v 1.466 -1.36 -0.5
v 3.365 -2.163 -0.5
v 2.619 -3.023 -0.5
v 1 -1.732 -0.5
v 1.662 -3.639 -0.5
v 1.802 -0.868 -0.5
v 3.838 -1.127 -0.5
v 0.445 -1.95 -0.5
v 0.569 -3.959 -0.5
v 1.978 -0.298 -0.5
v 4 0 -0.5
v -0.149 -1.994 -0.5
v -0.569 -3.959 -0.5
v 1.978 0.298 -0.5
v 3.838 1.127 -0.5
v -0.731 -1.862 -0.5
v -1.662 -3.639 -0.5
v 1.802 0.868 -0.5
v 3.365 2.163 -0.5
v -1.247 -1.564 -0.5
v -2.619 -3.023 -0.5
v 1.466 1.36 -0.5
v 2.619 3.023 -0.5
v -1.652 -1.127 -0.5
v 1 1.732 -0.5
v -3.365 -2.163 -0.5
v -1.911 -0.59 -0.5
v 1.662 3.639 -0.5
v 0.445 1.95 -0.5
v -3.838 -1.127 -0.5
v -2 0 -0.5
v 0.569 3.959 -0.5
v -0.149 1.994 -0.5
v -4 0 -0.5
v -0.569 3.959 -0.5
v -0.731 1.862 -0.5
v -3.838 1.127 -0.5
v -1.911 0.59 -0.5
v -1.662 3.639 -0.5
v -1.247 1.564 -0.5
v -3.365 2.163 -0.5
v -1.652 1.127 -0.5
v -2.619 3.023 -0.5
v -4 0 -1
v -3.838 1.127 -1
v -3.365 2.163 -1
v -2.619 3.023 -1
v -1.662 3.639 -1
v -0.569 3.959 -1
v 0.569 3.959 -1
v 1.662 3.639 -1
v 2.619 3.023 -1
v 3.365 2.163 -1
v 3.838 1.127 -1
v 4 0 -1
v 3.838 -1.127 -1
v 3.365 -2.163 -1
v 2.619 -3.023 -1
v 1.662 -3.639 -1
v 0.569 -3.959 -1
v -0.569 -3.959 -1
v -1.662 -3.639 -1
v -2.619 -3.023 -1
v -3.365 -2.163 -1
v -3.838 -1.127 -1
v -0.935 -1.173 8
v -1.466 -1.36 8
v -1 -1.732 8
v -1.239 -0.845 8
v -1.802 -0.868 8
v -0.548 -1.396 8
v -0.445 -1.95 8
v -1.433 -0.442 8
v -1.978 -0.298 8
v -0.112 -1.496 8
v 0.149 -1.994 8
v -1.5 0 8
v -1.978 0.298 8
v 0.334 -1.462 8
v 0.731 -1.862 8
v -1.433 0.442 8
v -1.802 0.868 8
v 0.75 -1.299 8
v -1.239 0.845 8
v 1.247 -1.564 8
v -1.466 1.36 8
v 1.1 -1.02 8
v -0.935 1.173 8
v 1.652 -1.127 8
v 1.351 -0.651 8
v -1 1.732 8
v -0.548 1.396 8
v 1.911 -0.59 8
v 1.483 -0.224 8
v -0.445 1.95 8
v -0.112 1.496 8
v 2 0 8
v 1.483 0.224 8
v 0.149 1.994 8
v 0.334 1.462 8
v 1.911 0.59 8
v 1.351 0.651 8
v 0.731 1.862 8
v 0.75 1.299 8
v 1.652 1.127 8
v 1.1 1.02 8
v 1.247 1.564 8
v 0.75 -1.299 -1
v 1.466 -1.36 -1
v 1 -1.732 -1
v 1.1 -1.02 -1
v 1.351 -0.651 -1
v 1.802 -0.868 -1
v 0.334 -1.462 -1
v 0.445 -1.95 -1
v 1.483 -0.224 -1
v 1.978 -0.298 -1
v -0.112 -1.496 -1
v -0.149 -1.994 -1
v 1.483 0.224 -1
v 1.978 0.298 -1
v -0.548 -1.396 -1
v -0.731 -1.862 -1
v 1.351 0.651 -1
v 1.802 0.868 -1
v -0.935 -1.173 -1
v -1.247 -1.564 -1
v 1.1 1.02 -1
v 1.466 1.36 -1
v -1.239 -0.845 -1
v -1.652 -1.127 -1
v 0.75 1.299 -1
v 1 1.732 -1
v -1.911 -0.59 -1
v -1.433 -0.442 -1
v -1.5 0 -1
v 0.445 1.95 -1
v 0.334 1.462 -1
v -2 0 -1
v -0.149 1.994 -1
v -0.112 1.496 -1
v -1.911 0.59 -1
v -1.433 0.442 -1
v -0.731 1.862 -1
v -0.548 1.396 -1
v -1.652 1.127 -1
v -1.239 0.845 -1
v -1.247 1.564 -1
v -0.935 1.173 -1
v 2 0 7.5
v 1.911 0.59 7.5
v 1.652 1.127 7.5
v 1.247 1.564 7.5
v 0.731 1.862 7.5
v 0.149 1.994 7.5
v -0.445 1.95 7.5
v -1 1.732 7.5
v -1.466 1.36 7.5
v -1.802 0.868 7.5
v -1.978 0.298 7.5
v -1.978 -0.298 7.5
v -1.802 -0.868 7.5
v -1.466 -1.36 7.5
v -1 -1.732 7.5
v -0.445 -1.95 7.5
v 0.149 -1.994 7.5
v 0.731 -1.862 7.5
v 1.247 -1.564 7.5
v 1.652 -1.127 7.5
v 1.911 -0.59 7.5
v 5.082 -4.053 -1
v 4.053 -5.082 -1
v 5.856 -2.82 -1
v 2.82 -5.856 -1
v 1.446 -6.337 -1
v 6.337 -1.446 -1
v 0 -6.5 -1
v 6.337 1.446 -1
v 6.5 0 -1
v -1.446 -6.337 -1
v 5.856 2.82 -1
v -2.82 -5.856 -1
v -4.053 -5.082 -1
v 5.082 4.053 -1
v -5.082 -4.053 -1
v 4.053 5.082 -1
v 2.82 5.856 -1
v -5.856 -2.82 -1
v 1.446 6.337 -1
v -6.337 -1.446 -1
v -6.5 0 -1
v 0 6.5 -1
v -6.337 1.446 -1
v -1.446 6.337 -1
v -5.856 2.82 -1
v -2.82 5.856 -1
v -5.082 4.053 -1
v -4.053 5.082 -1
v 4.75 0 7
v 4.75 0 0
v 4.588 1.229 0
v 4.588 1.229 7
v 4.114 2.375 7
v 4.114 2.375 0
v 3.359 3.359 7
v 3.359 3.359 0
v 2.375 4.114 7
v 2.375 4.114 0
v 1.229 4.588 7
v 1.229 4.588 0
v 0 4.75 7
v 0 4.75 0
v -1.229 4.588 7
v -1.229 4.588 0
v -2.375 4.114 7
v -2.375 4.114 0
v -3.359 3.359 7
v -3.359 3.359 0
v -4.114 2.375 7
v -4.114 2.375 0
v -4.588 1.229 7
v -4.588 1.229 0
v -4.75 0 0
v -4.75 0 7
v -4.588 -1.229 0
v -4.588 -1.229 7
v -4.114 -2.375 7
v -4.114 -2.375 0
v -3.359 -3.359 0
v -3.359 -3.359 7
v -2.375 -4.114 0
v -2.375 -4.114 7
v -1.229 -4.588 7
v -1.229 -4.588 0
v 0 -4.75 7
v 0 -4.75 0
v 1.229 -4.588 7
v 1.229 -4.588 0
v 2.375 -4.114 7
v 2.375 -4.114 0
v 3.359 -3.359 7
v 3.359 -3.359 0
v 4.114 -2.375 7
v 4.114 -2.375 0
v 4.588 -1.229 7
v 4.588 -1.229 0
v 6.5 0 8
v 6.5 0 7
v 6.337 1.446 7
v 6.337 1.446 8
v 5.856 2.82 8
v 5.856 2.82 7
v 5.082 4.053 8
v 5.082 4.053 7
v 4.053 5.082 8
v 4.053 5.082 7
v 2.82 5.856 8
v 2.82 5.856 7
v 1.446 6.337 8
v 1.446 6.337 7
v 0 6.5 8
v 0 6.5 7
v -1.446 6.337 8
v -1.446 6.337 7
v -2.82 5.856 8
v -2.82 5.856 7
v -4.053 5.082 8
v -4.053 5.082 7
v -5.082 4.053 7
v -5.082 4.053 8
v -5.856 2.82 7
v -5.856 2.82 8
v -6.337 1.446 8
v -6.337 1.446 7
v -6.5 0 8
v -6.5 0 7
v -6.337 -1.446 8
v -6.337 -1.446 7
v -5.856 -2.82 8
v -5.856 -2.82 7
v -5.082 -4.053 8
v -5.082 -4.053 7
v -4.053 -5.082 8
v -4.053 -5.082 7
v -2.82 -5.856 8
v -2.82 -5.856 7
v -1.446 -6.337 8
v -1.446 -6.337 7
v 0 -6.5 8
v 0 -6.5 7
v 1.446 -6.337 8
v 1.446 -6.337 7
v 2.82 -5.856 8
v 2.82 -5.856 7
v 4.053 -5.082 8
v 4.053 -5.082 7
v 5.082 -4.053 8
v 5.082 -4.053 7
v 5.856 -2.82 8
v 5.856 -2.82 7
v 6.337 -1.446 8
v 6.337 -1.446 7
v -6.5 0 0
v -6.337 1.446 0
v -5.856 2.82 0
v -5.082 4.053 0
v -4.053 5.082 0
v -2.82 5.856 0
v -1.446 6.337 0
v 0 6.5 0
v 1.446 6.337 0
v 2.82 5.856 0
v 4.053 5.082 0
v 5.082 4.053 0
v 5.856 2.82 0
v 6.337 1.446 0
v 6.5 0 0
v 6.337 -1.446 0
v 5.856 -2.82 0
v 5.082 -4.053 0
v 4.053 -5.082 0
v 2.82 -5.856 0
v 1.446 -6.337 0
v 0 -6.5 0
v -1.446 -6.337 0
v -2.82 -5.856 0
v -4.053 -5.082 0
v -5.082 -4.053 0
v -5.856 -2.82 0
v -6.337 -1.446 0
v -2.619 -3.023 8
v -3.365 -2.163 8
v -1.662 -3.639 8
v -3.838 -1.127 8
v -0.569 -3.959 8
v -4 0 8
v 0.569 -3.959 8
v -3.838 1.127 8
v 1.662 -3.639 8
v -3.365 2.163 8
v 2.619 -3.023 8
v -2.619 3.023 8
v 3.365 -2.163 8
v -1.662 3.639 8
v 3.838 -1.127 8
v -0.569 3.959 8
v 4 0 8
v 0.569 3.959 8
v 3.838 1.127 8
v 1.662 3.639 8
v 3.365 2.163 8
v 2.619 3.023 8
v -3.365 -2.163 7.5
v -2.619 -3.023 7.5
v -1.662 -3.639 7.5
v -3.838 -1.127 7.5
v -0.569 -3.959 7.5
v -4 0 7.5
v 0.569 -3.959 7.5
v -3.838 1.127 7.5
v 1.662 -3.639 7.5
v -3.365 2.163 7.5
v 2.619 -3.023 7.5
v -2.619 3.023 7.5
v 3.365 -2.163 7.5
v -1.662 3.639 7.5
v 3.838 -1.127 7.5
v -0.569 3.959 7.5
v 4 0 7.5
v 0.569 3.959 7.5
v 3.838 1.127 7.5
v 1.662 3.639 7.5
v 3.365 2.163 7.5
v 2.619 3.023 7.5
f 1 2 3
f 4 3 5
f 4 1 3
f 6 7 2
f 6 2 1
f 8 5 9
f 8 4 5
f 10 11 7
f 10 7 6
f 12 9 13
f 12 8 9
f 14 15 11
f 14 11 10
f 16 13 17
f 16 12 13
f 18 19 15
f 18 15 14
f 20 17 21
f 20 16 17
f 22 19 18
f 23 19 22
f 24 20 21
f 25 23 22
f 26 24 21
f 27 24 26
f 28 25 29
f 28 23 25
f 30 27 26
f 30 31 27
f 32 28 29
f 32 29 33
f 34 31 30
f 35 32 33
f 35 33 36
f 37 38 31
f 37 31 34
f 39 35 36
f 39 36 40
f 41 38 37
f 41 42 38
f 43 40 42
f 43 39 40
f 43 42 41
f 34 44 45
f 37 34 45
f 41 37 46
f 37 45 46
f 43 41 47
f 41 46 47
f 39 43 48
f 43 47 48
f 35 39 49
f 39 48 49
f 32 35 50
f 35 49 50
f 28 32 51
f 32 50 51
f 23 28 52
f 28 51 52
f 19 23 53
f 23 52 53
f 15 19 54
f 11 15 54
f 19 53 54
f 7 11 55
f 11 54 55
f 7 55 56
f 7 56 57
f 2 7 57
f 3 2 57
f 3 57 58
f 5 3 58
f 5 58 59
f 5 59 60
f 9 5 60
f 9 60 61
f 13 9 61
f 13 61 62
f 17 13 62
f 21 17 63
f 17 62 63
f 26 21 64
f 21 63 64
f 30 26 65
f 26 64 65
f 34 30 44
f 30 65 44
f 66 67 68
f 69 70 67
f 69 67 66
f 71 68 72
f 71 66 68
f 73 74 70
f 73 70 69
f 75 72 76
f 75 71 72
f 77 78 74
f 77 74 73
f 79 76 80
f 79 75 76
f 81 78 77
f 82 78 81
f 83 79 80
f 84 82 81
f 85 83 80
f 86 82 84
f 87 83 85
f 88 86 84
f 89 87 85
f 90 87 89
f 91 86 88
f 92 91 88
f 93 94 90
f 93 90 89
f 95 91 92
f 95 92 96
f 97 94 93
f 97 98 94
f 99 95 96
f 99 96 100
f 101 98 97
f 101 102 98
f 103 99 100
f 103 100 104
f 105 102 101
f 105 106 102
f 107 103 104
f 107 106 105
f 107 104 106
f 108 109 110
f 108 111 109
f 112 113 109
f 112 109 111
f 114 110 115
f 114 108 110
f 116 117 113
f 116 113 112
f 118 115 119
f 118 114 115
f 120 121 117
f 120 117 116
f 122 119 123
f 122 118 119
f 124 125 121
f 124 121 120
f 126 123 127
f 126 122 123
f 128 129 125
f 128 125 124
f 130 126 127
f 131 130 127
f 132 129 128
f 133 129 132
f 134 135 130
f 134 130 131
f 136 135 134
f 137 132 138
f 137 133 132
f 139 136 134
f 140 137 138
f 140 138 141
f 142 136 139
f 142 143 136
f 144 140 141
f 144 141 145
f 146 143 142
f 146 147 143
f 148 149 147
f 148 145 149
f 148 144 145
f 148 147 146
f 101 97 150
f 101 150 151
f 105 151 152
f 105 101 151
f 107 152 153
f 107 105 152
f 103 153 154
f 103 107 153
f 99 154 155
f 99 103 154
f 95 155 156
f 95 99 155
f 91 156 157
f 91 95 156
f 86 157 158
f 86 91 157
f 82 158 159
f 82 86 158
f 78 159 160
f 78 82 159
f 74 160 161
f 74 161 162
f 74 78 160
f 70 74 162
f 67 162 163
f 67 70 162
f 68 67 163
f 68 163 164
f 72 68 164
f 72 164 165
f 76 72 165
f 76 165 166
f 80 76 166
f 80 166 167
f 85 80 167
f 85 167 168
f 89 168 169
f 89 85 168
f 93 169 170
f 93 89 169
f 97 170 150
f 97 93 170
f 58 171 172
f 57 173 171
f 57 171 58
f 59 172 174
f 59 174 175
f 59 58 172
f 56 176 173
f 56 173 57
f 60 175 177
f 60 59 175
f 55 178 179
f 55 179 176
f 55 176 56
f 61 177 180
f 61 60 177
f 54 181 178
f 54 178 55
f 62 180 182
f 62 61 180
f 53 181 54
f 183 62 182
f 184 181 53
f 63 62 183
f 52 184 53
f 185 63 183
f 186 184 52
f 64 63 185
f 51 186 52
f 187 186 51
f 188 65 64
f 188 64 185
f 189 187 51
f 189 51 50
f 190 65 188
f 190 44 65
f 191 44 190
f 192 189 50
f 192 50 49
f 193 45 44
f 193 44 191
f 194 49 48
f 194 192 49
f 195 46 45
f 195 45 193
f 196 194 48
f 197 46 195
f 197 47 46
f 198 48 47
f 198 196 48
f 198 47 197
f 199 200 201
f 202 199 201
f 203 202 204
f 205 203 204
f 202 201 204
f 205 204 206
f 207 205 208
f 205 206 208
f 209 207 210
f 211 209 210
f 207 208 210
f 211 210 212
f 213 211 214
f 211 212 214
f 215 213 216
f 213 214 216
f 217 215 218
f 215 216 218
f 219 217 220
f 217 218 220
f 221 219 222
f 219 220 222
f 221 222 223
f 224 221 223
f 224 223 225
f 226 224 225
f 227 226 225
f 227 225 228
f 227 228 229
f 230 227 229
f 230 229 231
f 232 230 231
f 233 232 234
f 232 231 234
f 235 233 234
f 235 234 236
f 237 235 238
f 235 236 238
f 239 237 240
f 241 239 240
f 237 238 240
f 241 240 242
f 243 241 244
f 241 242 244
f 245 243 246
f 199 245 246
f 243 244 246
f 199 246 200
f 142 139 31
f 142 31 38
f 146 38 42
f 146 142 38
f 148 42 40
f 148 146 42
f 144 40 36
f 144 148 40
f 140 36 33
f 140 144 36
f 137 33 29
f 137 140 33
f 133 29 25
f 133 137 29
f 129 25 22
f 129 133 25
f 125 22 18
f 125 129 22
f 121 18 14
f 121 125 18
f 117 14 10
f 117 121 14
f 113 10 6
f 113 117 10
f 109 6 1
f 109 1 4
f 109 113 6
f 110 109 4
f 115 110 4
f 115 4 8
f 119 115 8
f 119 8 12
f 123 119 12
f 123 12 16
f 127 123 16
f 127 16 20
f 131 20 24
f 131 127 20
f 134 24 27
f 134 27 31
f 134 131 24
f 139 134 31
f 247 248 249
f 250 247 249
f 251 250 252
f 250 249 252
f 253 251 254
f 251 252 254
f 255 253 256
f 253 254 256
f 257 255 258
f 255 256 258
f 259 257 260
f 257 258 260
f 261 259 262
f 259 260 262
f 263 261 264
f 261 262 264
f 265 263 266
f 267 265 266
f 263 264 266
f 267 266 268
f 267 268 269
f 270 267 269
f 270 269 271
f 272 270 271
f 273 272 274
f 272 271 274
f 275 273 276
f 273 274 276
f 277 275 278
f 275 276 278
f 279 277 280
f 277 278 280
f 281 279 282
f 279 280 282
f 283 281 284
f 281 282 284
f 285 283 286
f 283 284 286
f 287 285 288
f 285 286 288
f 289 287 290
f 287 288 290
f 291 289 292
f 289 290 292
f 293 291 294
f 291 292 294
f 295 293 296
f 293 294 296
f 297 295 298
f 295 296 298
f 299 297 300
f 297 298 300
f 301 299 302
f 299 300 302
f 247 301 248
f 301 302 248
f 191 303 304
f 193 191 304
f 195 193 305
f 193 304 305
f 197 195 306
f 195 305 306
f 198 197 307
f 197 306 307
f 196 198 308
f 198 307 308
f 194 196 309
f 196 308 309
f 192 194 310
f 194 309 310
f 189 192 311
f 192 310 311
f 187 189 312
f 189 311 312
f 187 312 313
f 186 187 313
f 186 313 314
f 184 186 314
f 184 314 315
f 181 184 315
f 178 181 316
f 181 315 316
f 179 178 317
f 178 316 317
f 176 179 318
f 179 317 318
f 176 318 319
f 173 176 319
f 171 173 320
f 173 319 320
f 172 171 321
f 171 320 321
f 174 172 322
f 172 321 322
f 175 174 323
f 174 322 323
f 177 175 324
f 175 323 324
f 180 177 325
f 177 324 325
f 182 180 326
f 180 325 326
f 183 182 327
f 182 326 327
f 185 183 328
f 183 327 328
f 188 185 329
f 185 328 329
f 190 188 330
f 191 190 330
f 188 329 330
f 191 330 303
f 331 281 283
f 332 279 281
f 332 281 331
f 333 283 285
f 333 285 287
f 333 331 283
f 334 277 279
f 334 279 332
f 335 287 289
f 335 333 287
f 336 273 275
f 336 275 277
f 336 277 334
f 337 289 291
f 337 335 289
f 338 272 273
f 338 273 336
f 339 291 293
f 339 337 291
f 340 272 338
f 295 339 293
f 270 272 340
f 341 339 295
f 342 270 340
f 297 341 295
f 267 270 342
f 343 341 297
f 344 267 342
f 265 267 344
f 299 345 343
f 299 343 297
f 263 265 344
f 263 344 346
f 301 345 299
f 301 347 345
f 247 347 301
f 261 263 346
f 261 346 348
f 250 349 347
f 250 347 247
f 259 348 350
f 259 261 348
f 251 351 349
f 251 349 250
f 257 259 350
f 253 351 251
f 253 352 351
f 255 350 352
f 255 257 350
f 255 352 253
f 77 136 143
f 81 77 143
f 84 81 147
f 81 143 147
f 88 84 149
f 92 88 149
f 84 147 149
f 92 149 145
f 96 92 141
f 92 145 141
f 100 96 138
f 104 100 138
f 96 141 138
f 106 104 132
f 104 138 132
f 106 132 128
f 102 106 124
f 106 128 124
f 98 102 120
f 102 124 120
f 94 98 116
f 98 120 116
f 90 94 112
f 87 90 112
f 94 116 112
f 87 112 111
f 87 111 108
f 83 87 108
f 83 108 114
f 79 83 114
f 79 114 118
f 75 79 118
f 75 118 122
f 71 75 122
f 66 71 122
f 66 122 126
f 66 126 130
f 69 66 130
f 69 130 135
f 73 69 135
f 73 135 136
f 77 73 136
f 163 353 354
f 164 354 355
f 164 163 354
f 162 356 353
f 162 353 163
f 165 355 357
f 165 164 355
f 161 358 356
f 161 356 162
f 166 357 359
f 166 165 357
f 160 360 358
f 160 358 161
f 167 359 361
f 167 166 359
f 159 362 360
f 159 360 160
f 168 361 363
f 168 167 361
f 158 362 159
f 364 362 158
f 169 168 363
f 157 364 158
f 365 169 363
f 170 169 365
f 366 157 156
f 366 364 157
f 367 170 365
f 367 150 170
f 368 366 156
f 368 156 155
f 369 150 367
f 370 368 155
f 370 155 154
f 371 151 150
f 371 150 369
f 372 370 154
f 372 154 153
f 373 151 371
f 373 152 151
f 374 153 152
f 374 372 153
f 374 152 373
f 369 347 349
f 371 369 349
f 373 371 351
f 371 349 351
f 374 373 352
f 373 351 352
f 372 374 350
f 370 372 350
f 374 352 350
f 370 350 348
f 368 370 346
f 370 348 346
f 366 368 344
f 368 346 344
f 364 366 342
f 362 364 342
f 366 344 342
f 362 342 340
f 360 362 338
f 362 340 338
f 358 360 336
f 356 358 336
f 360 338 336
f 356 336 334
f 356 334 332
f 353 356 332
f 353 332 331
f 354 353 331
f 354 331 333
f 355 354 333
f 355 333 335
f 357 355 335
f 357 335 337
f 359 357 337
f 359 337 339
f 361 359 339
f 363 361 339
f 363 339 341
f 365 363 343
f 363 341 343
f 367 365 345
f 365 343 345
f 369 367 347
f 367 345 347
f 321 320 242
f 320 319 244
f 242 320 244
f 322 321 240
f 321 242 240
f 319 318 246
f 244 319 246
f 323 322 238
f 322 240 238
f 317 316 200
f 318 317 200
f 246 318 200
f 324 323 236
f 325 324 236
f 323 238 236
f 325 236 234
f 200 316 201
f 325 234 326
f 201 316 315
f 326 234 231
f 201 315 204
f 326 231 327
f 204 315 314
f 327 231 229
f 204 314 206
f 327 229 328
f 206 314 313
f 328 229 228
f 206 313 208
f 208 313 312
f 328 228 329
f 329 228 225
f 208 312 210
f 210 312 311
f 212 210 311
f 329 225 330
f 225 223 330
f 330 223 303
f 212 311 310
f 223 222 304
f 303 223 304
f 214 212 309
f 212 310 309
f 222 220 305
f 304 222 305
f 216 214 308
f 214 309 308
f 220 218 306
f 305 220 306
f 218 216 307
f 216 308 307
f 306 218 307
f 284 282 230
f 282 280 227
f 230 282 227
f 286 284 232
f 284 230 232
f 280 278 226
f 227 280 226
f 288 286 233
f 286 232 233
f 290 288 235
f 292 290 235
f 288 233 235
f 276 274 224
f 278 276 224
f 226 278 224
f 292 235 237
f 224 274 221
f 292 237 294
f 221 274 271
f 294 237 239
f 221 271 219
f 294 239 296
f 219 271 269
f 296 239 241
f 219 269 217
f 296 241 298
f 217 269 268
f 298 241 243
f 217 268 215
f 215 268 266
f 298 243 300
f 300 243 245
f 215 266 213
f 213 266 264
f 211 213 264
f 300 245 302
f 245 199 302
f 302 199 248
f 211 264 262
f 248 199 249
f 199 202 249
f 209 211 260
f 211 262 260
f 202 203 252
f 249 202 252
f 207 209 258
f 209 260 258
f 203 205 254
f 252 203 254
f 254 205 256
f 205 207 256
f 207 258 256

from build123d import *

# Parameters (mm, degrees)
SKETCH_1_R          = 4.75
EXTRUDE_1_DEPTH     = 7
SKETCH_2_R          = 6.5
EXTRUDE_2_DEPTH     = 1
SKETCH_3_R          = 6.5
EXTRUDE_3_DEPTH     = 1
SKETCH_4_R          = 1.5
CUT_EXTRUDE_1_DEPTH = 12
SKETCH_5_R          = 4
SKETCH_5_R_2        = 2
CUT_EXTRUDE_2_DEPTH = 0.5
SKETCH_6_R          = 4
SKETCH_6_R_2        = 2
CUT_EXTRUDE_3_DEPTH = 0.5


with BuildPart() as part:
    # 草图1 → 凸台-拉伸1 (new body)
    with BuildSketch(Plane.XY):
        Circle(SKETCH_1_R)
    extrude(amount=EXTRUDE_1_DEPTH)

    # 草图2 → 凸台-拉伸2 (add)
    with BuildSketch(Plane.XY.offset(7)):
        Circle(SKETCH_2_R)
    extrude(amount=EXTRUDE_2_DEPTH)

    # 草图3 → 凸台-拉伸3 (add)
    with BuildSketch(Plane(origin=(0, 0, 0), x_dir=(-1, 0, 0), z_dir=(0, 0, -1))):
        Circle(SKETCH_3_R)
    extrude(amount=EXTRUDE_3_DEPTH)

    # 草图4 → 切除-拉伸1 (cut)
    with BuildSketch(Plane(origin=(0, 0, -1), x_dir=(-1, 0, 0), z_dir=(0, 0, -1))):
        Circle(SKETCH_4_R)
    extrude(amount=-CUT_EXTRUDE_1_DEPTH, mode=Mode.SUBTRACT)

    # 草图5 → 切除-拉伸2 (cut)
    with BuildSketch(Plane(origin=(0, 0, -1), x_dir=(-1, 0, 0), z_dir=(0, 0, -1))):
        Circle(SKETCH_5_R)
        Circle(SKETCH_5_R_2, mode=Mode.SUBTRACT)
    extrude(amount=-CUT_EXTRUDE_2_DEPTH, mode=Mode.SUBTRACT)

    # 草图6 → 切除-拉伸3 (cut)
    with BuildSketch(Plane.XY.offset(8)):
        Circle(SKETCH_6_R)
        Circle(SKETCH_6_R_2, mode=Mode.SUBTRACT)
    extrude(amount=-CUT_EXTRUDE_3_DEPTH, mode=Mode.SUBTRACT)


solid = part.part
